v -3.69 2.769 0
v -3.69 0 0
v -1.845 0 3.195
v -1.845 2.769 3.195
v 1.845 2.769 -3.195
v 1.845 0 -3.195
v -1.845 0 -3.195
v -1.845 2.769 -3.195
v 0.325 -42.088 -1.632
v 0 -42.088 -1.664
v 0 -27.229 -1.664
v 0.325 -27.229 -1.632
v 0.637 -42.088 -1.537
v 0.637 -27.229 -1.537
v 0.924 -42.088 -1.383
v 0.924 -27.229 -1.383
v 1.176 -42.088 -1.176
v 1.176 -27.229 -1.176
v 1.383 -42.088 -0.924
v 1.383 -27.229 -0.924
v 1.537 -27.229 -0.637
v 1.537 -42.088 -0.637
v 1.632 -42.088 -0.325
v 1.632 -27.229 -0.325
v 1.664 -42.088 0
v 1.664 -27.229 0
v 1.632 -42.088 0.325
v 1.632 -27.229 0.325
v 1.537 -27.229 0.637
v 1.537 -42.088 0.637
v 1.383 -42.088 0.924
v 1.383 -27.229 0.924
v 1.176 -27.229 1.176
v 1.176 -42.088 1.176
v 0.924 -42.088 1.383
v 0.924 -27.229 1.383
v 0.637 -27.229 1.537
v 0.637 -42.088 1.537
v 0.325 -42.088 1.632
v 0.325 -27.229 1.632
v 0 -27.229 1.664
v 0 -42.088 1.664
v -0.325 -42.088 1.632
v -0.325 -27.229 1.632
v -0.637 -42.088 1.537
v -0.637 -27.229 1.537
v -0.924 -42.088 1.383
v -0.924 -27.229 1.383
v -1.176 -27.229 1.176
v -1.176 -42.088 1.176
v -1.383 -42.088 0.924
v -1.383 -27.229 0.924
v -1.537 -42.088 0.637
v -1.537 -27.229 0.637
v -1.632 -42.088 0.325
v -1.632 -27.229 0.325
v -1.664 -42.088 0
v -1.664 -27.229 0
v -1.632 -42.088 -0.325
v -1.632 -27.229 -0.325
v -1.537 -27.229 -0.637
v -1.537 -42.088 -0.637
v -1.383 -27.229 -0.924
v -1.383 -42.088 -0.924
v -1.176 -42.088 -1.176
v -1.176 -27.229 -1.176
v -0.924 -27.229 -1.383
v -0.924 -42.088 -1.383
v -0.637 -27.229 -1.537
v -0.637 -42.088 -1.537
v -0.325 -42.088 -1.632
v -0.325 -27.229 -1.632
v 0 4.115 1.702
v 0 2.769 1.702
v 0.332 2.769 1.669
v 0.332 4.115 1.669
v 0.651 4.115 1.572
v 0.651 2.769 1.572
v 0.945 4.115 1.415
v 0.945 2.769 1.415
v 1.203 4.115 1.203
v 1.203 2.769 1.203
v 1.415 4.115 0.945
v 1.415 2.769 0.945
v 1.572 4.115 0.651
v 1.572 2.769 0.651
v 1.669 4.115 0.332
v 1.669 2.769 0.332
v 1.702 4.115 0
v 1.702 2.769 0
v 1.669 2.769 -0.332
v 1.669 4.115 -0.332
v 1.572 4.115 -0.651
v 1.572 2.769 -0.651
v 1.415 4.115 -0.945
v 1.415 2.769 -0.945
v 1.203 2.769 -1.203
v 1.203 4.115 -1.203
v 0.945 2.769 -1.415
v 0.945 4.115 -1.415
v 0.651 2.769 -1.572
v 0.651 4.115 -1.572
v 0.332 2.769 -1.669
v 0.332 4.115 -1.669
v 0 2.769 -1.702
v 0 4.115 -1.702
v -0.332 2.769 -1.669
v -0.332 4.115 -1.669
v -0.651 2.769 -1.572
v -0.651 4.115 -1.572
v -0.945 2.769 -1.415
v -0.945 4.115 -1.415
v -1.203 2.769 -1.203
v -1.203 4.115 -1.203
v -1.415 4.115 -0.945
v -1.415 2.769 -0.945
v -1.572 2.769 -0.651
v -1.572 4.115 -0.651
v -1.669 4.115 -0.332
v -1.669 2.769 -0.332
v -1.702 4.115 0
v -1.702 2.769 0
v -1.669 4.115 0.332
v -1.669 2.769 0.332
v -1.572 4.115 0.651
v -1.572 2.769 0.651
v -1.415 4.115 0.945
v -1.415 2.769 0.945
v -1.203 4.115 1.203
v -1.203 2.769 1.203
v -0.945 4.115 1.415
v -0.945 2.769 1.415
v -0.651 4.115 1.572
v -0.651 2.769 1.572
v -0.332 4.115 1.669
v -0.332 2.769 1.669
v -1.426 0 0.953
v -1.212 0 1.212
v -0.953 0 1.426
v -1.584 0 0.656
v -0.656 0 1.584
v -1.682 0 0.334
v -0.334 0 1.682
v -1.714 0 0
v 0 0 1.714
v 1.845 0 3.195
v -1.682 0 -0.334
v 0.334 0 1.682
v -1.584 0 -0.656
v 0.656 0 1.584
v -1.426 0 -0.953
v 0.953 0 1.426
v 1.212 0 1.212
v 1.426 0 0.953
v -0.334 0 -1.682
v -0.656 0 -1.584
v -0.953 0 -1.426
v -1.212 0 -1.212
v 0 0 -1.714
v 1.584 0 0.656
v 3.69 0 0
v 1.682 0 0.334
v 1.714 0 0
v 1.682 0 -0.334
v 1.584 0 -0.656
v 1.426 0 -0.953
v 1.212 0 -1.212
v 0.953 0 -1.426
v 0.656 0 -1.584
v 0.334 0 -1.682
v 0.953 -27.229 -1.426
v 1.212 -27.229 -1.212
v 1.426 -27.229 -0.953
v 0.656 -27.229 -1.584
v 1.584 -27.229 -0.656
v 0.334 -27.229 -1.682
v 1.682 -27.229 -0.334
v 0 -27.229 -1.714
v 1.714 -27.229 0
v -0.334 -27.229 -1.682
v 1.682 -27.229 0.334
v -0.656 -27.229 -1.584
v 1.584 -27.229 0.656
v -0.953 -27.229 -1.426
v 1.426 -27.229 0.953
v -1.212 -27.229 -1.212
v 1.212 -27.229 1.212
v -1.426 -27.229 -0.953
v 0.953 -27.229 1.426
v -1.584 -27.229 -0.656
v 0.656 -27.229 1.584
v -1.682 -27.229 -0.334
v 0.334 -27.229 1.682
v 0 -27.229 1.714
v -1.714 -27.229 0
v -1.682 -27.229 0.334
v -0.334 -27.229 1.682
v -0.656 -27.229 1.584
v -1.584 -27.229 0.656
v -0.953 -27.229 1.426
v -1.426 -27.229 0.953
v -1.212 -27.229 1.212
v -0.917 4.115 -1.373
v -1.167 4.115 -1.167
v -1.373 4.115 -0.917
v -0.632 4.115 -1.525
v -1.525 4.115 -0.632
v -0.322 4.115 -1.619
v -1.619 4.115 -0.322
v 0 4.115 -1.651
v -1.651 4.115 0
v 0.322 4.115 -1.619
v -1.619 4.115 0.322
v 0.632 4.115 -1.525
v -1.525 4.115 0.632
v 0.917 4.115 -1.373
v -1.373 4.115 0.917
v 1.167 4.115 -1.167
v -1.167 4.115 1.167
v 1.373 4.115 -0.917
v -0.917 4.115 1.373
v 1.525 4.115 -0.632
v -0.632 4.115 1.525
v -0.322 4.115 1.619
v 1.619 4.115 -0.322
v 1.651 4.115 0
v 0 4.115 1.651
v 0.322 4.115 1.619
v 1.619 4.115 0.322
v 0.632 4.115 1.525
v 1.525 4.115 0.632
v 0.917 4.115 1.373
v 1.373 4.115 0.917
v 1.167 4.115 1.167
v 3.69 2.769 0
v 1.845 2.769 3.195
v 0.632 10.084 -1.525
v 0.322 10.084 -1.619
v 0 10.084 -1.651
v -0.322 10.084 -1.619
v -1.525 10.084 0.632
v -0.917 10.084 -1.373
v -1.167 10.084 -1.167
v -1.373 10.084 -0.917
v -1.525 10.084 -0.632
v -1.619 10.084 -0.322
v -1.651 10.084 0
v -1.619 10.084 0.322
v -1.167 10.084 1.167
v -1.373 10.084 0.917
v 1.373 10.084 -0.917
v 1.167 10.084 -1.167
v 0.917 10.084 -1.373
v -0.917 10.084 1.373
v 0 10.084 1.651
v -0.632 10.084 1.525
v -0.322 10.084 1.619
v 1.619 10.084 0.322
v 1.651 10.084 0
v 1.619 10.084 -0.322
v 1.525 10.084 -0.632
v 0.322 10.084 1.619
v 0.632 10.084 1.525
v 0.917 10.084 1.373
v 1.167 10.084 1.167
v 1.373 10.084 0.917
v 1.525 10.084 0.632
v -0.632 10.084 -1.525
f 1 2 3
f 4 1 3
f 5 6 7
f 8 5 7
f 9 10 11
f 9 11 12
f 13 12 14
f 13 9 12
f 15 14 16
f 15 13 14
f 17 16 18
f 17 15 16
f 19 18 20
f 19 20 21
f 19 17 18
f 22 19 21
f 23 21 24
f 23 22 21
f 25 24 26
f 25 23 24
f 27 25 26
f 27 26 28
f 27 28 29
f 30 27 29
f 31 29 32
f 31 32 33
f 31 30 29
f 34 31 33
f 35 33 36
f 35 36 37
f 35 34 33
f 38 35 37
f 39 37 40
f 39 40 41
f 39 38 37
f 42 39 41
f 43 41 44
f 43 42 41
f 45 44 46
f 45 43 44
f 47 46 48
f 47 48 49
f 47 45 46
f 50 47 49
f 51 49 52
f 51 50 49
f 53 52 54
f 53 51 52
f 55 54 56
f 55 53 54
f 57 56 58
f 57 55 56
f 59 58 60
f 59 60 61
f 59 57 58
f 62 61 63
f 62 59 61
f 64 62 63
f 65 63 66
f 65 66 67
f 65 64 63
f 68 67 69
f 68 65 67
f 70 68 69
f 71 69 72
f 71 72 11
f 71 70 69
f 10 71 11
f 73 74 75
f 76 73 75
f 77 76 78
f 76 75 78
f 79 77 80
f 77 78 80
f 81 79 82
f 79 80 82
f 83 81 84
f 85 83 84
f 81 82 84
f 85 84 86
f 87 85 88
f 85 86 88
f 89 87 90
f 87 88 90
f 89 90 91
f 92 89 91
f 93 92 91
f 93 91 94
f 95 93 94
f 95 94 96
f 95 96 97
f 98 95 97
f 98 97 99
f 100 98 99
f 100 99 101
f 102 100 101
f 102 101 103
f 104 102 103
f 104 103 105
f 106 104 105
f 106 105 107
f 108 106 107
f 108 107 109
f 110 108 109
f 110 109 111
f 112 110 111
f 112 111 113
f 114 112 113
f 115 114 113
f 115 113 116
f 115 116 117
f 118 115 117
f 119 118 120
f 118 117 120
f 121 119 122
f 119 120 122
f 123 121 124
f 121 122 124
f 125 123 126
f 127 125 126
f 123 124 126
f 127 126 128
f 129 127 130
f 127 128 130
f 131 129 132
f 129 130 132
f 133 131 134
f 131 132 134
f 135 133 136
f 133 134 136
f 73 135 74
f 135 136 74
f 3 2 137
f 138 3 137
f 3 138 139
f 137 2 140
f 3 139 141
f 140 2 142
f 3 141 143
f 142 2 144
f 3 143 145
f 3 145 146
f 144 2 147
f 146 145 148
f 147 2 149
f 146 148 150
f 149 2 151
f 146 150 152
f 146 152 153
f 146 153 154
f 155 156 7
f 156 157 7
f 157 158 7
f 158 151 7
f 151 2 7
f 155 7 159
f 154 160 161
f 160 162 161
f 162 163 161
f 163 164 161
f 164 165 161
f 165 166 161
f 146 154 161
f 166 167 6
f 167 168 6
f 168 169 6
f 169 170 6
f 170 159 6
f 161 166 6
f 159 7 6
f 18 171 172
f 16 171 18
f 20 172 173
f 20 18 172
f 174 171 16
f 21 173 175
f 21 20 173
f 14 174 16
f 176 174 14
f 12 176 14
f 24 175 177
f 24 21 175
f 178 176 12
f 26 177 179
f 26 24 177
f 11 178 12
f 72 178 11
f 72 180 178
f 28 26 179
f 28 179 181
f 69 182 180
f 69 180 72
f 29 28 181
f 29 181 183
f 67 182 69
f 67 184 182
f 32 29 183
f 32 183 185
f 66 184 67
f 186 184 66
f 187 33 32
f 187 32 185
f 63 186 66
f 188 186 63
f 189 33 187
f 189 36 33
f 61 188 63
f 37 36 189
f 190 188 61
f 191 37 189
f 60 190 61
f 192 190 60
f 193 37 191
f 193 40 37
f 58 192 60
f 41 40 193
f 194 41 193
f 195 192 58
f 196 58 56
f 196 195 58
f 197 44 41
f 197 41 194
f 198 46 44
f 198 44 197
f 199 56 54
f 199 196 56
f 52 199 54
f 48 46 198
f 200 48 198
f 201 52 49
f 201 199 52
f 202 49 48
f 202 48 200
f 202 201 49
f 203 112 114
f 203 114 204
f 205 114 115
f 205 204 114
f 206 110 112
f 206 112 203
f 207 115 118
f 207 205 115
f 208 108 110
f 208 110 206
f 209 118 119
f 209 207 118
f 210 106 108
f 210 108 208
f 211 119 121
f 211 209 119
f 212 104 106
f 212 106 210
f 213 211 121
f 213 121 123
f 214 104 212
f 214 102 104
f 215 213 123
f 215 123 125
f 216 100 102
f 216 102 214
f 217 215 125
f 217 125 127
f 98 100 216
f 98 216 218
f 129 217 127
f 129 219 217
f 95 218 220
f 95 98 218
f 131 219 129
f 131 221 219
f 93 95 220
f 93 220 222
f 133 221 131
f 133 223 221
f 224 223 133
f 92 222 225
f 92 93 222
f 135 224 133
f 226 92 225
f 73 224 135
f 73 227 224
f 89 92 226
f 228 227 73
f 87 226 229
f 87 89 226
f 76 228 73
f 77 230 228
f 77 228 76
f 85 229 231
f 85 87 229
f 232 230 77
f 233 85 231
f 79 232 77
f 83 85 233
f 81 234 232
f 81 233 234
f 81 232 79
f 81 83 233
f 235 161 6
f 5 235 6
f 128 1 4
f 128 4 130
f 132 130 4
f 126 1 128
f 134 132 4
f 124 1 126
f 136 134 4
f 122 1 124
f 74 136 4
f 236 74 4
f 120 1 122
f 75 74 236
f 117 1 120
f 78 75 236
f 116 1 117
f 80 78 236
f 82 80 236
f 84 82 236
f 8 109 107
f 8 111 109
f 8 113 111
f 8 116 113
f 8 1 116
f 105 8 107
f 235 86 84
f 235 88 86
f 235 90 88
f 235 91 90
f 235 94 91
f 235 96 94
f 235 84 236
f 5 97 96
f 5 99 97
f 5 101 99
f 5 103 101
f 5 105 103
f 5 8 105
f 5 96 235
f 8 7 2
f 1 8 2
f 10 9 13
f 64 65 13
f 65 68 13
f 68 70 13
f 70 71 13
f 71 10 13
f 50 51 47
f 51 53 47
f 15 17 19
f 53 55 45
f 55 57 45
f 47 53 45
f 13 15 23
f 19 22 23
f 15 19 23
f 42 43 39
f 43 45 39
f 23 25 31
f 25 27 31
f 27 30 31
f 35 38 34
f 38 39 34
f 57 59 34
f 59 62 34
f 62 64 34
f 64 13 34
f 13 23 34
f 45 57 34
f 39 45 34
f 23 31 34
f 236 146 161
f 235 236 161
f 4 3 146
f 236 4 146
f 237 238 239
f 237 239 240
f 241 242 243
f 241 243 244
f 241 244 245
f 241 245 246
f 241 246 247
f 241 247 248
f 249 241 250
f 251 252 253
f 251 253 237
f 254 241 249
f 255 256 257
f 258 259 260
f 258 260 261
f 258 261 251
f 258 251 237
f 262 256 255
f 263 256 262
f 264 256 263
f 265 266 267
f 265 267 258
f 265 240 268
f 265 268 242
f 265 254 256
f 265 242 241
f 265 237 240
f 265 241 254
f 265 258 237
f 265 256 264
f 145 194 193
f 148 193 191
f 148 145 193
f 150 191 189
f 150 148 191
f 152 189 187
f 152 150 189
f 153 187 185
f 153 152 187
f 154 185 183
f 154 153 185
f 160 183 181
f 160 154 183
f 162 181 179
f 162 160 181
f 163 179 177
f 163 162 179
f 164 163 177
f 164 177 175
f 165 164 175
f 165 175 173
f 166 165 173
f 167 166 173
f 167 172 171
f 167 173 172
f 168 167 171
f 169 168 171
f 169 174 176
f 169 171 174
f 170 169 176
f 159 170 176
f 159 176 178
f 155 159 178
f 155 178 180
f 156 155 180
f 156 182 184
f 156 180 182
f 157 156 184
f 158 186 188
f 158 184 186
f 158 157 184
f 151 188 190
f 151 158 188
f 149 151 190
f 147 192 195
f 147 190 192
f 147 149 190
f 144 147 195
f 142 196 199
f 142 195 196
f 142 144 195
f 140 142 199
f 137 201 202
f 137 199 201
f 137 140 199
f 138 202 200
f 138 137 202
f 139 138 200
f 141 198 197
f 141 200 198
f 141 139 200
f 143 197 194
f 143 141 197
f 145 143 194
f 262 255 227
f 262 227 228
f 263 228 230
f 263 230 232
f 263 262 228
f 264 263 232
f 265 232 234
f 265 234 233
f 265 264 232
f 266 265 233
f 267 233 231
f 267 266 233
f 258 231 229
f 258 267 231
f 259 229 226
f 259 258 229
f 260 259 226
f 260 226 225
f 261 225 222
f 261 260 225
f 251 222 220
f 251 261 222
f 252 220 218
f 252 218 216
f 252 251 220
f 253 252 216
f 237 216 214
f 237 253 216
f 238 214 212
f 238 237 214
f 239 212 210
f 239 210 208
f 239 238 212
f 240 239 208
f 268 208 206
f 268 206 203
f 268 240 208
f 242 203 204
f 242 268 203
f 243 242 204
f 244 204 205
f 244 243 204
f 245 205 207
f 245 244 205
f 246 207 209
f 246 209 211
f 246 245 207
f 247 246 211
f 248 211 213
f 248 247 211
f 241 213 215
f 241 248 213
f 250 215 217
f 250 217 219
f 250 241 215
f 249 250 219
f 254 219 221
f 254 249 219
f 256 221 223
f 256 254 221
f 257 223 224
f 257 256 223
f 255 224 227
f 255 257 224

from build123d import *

# Parameters (mm, degrees)
SKETCH1_R           = 1.7145
BOSS_EXTRUDE1_DEPTH = 42.0878
BOSS_EXTRUDE2_DEPTH = 2.7686
SKETCH3_R           = 1.7018
BOSS_EXTRUDE3_DEPTH = 7.3152
SKETCH4_R           = 1.7018
SKETCH4_R_2         = 1.651
CUT_EXTRUDE1_DEPTH  = 5.969
SKETCH5_R           = 1.7145
SKETCH5_R_2         = 1.6637
CUT_EXTRUDE2_DEPTH  = 14.859


with BuildPart() as part:
    # Sketch1 → Boss-Extrude1 (new body)
    with BuildSketch(Plane(origin=(0, 0, 0), x_dir=(1, 0, 0), z_dir=(0, 1, 0))):
        with Locations(Location((0, 0, 0), (0, 0, 270))):  # turned: the seam where the file's is
            Circle(SKETCH1_R)
    extrude(amount=-BOSS_EXTRUDE1_DEPTH)

    # Sketch2 → Boss-Extrude2 (add)
    with BuildSketch(Plane(origin=(0, 0, 0), x_dir=(1, 0, 0), z_dir=(0, 1, 0))):
        Polygon((1.844793874, 3.195276719), (-1.844793874, 3.195276719), (-3.689587747, 0), (-1.844793874, -3.195276719), (1.844793874, -3.195276719), (3.689587747, 0), align=None)
    extrude(amount=BOSS_EXTRUDE2_DEPTH)

    # Sketch3 → Boss-Extrude3 (add)
    with BuildSketch(Plane(origin=(0, 2.7686, 0), x_dir=(1, 0, 0), z_dir=(0, 1, 0))):
        with Locations(Location((0, 0, 0), (0, 0, 270))):  # turned: the seam where the file's is
            Circle(SKETCH3_R)
    extrude(amount=BOSS_EXTRUDE3_DEPTH)

    # Sketch4 → Cut-Extrude1 (cut)
    with BuildSketch(Plane(origin=(0, 10.0838, 0), x_dir=(1, 0, 0), z_dir=(0, 1, 0))):
        with Locations(Location((0, 0, 0), (0, 0, 270))):  # turned: the seam where the file's is
            Circle(SKETCH4_R)
        with Locations(Location((0, 0, 0), (0, 0, 270))):  # turned: the seam where the file's is
            Circle(SKETCH4_R_2, mode=Mode.SUBTRACT)
    extrude(amount=-CUT_EXTRUDE1_DEPTH, mode=Mode.SUBTRACT)

    # Sketch5 → Cut-Extrude2 (cut)
    with BuildSketch(Plane.XZ.offset(42.0878)):
        with Locations(Location((0, 0, 0), (0, 0, 90))):  # turned: the seam where the file's is
            Circle(SKETCH5_R)
        with Locations(Location((0, 0, 0), (0, 0, 270))):  # turned: the seam where the file's is
            Circle(SKETCH5_R_2, mode=Mode.SUBTRACT)
    extrude(amount=-CUT_EXTRUDE2_DEPTH, mode=Mode.SUBTRACT)


solid = part.part
